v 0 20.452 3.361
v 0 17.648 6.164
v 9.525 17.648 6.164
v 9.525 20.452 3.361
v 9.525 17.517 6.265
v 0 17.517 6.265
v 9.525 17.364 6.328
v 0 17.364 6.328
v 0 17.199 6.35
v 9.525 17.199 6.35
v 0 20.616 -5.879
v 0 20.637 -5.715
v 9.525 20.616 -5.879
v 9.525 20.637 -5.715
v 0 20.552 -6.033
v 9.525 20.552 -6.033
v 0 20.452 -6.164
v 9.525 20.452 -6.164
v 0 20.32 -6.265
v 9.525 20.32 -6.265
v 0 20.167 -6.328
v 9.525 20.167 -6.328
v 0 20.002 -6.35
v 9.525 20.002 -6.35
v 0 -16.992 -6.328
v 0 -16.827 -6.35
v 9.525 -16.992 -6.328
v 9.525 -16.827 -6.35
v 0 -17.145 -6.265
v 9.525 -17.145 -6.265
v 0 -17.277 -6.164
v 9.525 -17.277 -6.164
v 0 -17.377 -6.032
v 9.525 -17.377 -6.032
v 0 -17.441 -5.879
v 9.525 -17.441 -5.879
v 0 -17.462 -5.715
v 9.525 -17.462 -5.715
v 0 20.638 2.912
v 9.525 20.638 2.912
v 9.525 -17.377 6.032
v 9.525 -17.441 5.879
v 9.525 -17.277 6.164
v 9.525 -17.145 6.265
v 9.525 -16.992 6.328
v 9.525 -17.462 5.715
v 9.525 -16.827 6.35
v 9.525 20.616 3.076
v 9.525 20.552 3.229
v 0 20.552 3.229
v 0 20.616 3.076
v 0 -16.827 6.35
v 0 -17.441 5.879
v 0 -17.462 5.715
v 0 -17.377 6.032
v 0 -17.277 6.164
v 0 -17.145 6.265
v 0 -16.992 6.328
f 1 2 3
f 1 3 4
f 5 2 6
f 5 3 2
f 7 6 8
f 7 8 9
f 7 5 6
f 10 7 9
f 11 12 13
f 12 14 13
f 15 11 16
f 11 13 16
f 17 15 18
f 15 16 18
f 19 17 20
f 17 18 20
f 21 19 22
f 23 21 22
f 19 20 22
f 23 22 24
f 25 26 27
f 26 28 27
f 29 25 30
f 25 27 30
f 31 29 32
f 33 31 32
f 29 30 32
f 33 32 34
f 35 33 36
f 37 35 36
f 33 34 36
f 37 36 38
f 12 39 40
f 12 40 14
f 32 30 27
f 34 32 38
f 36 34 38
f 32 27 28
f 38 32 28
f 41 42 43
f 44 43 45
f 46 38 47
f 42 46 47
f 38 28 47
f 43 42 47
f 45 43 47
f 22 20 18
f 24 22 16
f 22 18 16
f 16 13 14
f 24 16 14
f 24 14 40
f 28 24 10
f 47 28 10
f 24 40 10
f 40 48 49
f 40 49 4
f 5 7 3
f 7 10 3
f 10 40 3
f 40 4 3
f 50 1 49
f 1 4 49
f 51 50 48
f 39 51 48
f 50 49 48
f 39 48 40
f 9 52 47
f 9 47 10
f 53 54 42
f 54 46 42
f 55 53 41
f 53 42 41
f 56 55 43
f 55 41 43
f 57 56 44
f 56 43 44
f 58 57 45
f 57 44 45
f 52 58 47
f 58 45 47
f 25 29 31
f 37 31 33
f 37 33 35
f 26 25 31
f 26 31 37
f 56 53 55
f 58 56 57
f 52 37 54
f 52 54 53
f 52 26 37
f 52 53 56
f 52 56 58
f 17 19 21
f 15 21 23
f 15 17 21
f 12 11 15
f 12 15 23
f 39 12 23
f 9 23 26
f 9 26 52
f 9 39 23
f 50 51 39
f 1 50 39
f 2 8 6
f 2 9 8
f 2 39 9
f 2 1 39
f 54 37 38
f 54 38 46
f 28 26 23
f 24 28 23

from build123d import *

# Parameters (mm, degrees)
BOSS_EXTRUDE1_DEPTH = 9.525
FILLET1_R           = 0.635


with BuildPart() as part:
    # Sketch1 → Boss-Extrude1 (new body)
    with BuildSketch(Plane(origin=(0, 0, 0), x_dir=(0, 0, -1), z_dir=(1, 0, 0))):
        Polygon((-6.35, 17.4625), (-3.175, 20.6375), (6.35, 20.6375), (6.35, 17.4625), (6.35, -17.4625), (-6.35, -17.4625), align=None)
    extrude(amount=BOSS_EXTRUDE1_DEPTH)

    # Fillet1
    fillet1_edges = [part.edges().sort_by_distance(p)[0] for p in [
        (4.7625, -17.4625, -6.35),
        (4.7625, -17.4625, 6.35),
        (4.7625, 17.4625, 6.35),
        (4.7625, 20.6375, 3.175),
        (4.7625, 20.6375, -6.35),
    ]]
    fillet(fillet1_edges, radius=FILLET1_R)


solid = part.part
